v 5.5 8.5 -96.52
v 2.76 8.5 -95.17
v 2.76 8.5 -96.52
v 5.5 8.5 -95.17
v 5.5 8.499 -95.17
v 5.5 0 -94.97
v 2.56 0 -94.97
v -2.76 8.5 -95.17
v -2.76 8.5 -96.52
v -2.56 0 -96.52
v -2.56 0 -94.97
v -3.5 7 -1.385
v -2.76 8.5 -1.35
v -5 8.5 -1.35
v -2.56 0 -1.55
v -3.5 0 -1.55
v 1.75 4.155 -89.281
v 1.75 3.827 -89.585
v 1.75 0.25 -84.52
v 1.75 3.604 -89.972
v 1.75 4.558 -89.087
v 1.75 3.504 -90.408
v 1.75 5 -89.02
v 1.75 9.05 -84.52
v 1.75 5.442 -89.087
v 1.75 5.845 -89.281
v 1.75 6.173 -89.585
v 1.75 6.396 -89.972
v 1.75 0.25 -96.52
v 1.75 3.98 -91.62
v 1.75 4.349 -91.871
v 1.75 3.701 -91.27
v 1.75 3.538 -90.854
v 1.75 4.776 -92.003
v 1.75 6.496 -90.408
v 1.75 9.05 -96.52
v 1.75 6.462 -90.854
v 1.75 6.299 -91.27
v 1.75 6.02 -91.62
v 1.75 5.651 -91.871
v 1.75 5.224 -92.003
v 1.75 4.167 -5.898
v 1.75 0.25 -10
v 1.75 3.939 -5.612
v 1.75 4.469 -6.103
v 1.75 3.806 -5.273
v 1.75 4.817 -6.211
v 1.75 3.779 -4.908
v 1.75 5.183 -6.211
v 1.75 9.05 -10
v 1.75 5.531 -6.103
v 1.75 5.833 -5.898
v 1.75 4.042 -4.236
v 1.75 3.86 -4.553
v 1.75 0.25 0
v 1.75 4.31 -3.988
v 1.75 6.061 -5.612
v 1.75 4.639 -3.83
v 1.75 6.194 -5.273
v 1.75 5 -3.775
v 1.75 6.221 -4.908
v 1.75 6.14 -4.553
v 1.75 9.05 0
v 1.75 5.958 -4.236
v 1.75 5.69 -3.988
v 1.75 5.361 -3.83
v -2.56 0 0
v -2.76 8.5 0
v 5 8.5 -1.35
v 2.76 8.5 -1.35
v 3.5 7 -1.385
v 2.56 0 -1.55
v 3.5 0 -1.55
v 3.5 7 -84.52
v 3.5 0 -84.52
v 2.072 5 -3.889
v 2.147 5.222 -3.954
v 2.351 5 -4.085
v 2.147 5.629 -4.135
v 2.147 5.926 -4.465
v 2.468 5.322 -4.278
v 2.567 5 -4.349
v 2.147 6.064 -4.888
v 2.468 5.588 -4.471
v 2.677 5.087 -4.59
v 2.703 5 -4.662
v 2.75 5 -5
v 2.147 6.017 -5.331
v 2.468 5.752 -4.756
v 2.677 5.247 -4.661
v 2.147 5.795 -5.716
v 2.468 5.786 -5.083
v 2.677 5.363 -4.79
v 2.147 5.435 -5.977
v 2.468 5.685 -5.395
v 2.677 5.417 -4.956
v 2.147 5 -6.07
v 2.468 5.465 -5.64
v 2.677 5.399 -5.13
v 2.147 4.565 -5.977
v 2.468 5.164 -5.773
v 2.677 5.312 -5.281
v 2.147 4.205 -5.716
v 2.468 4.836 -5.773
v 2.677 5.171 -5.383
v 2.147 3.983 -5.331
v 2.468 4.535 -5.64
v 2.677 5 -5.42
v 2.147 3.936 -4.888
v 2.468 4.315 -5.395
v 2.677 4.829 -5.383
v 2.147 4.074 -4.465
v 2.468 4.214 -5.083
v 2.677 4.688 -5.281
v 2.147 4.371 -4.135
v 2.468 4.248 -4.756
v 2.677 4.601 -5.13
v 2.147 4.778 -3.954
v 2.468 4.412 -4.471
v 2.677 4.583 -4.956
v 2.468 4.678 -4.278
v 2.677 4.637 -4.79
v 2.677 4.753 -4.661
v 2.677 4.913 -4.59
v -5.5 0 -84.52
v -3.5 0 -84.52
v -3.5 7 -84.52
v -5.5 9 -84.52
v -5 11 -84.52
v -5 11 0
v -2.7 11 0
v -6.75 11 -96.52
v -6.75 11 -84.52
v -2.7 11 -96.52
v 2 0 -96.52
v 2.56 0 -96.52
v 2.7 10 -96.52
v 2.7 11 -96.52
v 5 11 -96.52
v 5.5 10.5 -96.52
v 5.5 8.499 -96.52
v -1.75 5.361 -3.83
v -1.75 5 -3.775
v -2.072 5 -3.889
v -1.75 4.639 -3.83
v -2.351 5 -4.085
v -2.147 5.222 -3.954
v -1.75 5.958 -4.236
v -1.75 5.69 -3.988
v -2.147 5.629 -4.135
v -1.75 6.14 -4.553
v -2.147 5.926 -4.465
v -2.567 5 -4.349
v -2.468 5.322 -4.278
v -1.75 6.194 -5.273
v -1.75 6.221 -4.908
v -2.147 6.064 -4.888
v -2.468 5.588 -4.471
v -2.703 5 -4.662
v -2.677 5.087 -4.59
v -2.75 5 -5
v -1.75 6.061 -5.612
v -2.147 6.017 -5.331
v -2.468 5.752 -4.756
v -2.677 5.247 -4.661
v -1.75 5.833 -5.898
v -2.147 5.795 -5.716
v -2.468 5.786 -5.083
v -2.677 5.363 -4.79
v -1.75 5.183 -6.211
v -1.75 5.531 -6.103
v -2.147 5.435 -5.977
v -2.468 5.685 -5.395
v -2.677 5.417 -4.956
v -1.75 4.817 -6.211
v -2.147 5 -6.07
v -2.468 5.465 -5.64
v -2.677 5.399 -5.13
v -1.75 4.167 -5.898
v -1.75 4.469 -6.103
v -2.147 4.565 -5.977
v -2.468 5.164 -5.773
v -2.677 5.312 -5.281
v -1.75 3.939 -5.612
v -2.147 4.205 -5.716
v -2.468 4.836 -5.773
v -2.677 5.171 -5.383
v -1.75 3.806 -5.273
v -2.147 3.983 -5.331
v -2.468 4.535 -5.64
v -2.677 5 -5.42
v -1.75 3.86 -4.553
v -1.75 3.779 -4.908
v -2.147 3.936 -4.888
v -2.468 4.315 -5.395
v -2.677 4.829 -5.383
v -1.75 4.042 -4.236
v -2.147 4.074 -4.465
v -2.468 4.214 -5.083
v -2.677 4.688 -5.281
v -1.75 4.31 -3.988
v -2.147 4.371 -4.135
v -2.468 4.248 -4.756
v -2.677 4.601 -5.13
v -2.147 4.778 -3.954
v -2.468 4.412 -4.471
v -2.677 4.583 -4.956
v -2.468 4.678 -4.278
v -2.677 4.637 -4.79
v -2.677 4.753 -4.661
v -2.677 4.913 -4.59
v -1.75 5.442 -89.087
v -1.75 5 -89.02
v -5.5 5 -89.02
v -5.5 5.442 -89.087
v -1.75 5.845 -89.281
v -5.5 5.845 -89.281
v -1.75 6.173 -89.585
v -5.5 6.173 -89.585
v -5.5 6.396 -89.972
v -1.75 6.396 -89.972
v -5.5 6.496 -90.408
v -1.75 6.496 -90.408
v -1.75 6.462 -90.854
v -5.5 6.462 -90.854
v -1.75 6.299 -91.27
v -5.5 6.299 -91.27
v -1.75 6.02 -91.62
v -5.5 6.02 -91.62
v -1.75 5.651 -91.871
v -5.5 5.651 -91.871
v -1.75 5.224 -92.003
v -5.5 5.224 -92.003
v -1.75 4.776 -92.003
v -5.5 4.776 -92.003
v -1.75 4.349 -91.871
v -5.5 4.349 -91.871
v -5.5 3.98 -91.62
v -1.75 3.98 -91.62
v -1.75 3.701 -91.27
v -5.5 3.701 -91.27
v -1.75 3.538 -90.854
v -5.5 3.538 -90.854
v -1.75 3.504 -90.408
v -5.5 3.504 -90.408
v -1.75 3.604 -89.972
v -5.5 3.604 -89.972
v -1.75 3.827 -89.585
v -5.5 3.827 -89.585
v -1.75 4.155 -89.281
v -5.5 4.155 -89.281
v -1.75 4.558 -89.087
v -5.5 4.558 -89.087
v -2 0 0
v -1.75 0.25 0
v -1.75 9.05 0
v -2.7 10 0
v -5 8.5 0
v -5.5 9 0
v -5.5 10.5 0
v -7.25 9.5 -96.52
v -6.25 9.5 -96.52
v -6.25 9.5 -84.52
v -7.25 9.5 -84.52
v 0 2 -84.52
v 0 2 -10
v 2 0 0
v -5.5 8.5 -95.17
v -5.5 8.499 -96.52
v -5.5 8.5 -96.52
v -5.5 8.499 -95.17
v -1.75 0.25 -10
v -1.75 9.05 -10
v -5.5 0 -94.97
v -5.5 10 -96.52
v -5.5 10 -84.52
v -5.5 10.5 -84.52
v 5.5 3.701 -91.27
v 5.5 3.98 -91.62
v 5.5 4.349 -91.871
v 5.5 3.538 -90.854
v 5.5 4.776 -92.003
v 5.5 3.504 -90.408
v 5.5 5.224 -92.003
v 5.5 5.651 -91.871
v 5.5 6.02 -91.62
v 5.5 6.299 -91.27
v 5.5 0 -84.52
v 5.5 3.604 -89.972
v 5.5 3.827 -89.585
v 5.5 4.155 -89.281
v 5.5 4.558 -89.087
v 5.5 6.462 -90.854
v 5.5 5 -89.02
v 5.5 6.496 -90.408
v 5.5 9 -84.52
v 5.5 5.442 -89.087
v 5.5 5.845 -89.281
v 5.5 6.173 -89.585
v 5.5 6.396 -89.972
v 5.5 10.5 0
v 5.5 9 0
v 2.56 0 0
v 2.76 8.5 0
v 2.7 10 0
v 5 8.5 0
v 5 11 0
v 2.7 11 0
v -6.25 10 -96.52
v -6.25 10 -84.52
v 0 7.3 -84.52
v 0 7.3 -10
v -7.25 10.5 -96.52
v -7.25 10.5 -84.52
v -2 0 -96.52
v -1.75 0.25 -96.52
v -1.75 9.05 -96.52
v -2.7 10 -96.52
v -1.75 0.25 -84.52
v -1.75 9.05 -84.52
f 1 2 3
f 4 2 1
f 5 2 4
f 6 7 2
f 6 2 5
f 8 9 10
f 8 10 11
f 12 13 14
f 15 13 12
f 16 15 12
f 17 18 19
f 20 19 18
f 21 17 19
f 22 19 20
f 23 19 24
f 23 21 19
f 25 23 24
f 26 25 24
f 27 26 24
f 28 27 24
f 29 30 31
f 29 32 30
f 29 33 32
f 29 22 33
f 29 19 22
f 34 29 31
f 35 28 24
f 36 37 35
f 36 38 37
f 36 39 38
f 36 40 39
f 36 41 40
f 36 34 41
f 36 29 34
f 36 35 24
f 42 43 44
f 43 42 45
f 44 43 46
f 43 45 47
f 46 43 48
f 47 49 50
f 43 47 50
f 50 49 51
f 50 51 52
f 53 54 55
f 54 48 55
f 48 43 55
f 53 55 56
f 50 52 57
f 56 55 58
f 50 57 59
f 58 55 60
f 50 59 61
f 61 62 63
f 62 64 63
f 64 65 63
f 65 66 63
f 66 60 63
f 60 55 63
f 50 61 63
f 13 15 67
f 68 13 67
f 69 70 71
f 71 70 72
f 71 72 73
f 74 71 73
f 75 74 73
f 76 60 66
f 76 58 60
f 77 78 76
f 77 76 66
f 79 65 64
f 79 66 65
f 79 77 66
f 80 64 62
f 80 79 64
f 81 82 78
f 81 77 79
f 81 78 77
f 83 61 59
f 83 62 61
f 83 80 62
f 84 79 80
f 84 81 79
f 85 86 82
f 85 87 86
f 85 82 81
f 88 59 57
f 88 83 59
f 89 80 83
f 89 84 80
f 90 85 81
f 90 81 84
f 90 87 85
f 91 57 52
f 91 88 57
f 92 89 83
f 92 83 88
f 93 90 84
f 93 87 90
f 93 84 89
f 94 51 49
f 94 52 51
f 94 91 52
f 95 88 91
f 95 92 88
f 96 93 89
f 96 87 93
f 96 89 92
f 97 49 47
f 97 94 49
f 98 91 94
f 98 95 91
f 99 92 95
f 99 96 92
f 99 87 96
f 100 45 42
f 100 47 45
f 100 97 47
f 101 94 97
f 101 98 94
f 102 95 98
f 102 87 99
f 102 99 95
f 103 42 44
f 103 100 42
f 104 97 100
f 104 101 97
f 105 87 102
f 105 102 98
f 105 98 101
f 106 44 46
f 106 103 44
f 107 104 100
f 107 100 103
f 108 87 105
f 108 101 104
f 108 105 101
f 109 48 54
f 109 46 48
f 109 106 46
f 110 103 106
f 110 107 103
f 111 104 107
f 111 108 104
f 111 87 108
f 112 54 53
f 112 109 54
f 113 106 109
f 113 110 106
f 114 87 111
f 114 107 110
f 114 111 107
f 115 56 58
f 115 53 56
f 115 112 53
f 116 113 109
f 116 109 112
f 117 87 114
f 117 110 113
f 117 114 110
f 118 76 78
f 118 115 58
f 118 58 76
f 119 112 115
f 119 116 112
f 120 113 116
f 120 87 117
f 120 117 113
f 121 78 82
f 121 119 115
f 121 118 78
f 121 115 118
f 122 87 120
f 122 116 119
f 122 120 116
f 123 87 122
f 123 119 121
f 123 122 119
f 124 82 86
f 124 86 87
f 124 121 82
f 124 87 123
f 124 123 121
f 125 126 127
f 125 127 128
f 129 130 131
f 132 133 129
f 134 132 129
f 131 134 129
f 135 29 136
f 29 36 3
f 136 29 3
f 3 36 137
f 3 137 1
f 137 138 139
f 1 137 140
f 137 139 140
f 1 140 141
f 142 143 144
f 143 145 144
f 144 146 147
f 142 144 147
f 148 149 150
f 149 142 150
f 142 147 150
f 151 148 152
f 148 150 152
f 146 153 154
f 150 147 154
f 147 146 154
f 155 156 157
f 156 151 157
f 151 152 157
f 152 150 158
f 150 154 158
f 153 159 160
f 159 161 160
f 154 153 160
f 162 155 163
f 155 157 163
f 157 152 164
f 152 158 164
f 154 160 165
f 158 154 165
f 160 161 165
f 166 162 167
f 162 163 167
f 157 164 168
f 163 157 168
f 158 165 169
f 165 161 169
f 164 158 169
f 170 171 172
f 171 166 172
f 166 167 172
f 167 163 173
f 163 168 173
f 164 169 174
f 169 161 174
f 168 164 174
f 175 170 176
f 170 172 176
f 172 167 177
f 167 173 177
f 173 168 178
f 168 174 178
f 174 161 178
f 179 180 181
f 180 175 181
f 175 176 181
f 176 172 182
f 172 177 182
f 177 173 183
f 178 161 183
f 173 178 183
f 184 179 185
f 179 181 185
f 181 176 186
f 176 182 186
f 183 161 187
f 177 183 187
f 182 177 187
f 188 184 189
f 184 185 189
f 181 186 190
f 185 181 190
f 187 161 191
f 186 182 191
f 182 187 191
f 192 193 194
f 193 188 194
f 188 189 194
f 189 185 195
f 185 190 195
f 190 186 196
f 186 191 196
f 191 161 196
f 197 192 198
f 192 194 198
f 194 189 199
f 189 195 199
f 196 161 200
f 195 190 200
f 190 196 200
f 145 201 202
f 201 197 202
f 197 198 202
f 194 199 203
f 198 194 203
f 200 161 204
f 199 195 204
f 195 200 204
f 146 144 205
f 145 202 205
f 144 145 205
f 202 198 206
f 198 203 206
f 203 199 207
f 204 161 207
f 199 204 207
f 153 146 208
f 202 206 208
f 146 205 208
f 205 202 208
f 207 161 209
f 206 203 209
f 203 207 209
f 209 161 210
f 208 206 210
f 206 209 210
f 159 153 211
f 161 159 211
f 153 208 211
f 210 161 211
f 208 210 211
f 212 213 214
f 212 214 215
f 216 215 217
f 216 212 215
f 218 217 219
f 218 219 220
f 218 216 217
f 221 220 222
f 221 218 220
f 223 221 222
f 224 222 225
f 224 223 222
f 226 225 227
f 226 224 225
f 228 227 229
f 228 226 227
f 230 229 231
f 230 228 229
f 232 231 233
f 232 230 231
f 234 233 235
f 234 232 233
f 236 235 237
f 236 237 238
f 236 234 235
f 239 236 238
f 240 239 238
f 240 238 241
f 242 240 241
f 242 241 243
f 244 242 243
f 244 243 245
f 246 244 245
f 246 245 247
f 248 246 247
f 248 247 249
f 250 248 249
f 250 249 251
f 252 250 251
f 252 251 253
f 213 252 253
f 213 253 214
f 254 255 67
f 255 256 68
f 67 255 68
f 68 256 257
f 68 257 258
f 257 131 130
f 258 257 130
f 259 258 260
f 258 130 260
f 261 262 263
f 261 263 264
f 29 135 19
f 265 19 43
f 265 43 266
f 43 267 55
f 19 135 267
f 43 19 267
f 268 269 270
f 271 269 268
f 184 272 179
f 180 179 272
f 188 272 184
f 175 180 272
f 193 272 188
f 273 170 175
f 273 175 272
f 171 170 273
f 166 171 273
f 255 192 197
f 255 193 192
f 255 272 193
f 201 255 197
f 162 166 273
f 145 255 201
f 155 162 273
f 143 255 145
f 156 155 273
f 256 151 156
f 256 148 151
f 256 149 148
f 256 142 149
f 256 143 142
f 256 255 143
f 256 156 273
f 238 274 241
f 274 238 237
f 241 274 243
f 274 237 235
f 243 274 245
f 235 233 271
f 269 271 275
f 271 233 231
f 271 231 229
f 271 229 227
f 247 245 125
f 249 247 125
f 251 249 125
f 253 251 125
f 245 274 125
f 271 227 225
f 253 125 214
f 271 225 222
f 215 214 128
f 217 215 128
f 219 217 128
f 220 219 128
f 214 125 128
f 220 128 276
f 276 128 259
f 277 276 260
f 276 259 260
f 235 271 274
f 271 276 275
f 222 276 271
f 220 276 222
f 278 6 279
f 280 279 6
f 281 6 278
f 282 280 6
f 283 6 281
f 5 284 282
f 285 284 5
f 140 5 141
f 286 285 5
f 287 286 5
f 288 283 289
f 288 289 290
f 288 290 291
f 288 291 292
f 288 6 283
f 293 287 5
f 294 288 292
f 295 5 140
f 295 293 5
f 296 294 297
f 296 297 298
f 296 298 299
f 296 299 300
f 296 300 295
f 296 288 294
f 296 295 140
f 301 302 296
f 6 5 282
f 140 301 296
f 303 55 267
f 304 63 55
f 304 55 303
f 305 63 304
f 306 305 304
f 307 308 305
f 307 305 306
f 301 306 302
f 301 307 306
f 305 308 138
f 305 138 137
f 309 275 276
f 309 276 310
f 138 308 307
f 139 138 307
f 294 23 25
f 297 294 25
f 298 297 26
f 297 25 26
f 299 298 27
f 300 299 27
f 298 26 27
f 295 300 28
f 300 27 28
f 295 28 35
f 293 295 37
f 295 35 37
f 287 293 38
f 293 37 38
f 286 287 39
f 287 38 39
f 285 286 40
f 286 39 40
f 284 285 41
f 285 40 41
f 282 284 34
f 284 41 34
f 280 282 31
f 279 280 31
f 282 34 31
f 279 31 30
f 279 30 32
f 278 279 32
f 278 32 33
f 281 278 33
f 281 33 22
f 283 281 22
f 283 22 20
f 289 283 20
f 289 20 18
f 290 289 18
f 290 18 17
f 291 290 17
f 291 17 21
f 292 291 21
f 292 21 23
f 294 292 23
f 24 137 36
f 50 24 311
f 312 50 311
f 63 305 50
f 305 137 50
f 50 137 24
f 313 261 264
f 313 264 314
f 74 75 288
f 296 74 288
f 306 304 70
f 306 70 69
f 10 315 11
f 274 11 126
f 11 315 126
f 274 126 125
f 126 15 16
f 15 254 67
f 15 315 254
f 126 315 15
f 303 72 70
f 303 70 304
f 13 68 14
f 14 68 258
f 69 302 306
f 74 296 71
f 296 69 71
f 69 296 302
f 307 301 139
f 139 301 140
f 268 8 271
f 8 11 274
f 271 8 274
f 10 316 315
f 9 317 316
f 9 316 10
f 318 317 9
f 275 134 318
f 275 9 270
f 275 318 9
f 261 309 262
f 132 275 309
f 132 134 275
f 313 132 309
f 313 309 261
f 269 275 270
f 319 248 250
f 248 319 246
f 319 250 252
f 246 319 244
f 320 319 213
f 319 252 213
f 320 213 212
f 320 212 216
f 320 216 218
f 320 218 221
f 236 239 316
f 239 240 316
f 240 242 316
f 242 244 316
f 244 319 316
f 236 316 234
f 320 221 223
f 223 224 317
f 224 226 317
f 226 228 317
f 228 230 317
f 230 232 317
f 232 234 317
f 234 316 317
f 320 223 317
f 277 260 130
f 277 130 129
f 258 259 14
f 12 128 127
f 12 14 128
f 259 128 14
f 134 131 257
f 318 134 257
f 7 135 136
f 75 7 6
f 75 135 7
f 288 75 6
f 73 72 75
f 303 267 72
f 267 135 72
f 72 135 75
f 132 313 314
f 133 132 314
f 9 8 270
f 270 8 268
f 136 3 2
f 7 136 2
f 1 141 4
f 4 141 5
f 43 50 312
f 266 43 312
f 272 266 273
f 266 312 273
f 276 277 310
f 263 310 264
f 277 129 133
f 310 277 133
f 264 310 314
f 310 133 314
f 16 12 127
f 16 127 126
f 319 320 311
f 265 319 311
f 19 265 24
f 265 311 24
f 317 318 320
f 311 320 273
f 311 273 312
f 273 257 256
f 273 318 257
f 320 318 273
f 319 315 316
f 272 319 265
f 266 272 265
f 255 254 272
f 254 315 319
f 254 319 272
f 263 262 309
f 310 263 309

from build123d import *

# Parameters (mm, degrees)
SKETCH1_W                        = 5.5
SKETCH1_H                        = 11
MAIN_BASE_DEPTH                  = 96.52
SIDE_CUT_OUT_DEPTH               = 84.52
TOP_RUBBER_BAND_CUT_OUT_DEPTH    = 98.300361767
BOTTOM_RUBBER_BAND_CUT_OUT_DEPTH = 98.300361767
SKETCH6_W                        = 1.75
SKETCH6_H                        = 11
MOTOR_PULLEY_CUT_OUT_DEPTH       = 12
SKETCH7_W                        = 1.75
SKETCH7_H                        = 11
PULLEY_CUT_OUT_DEPTH             = 10
SKETCH11_R                       = 1.5
MOTOR_SHAFT_CUT_OUT_DEPTH        = 98.217143036
SKETCH17_W                       = 3.14
SKETCH17_H                       = 2.8
MOUNTING_POINTS_DEPTH            = 8.5
MOUNTING_POINTS_DRAFT            = -1.348
MOUNTING_POINTS_PROFILE_2_DEPTH  = 8.5
MOUNTING_POINTS_PROFILE_2_DRAFT  = -1.348
SKETCH13_W                       = 1
SKETCH13_H                       = 0.5
BOSS_EXTRUDE3_DEPTH              = 12
RAIL_CHAMFER_SIZE                = 0.5


with BuildPart() as part:
    # Sketch1 → main_base (new body)
    with BuildSketch(Plane.XY):
        with Locations((2.75, 5.5)):
            Rectangle(SKETCH1_W, SKETCH1_H)
    extrude(amount=-MAIN_BASE_DEPTH)

    # Sketch3 → side_cut_out (cut)
    with BuildSketch(Plane.XY):
        Polygon((5.5, 9), (3.5, 7), (3.5, 0), (5.5, 0), align=None)
    extrude(amount=-SIDE_CUT_OUT_DEPTH, mode=Mode.SUBTRACT)

    # Sketch4 → top_rubber_band_cut_out (cut, through all)
    with BuildSketch(Plane.XY):
        Polygon((0, 7.3), (0, 11), (2.7, 11), (2.7, 10), align=None)
    extrude(amount=-TOP_RUBBER_BAND_CUT_OUT_DEPTH, mode=Mode.SUBTRACT)

    # Sketch5 → bottom_rubber_band_cut_out (cut, through all)
    with BuildSketch(Plane.XY):
        Polygon((2, 0), (0, 2), (0, 0), align=None)
    extrude(amount=-BOTTOM_RUBBER_BAND_CUT_OUT_DEPTH, mode=Mode.SUBTRACT)

    # Sketch6 → motor_pulley_cut_out (cut)
    with BuildSketch(Plane(origin=(0, 0, -96.52), x_dir=(-1, 0, 0), z_dir=(0, 0, -1))):
        with Locations((-0.875, 5.5)):
            Rectangle(SKETCH6_W, SKETCH6_H)
    extrude(amount=-MOTOR_PULLEY_CUT_OUT_DEPTH, mode=Mode.SUBTRACT)

    # Sketch7 → pulley_cut_out (cut)
    with BuildSketch(Plane.XY):
        with Locations((0.875, 5.5)):
            Rectangle(SKETCH7_W, SKETCH7_H)
    extrude(amount=-PULLEY_CUT_OUT_DEPTH, mode=Mode.SUBTRACT)

    # Sketch10 → half_circle_cut_out (revolve, cut)
    with BuildSketch(Plane(origin=(0, 5, 0), x_dir=(1, 0, 0), z_dir=(0, 1, 0))):
        with BuildLine():
            Line((1.5, 5), (1.5, 3.75))
            ThreePointArc((1.5, 3.75), (2.383883476, 4.116116524), (2.75, 5))
            Line((2.75, 5), (1.5, 5))
        make_face()
    revolve(axis=Axis((2.75, 5, -5), (-1, 0, 0)), mode=Mode.SUBTRACT)

    # Sketch11 → motor_shaft_cut_out (cut, through all)
    with BuildSketch(Plane.ZY.offset(-1.75)):
        with Locations((-90.52, 5)):
            Circle(SKETCH11_R)
    extrude(amount=-MOTOR_SHAFT_CUT_OUT_DEPTH, mode=Mode.SUBTRACT)


with BuildPart() as mounting_points_tool:
    # Sketch17 → mounting_points (with draft: the straight prism first)
    with BuildSketch(Plane.XZ):
        with Locations((4.13, -0.15)):
            Rectangle(SKETCH17_W, SKETCH17_H)
    extrude(amount=-MOUNTING_POINTS_DEPTH)
    # mounting_points: the draft: its side faces are tilted about the plane it starts from
    mounting_points_sides = [mounting_points_tool.faces().sort_by_distance(p)[0] for p in [
        (4.13, 4.25, 1.25),
        (2.56, 4.25, -0.15),
        (4.13, 4.25, -1.55),
        (5.7, 4.25, -0.15),
    ]]
    draft(mounting_points_sides, Plane.XZ, MOUNTING_POINTS_DRAFT)


with BuildPart() as part_1:
    add(part.part)

    # mounting_points: cut by mounting_points_tool
    add(mounting_points_tool.part, mode=Mode.SUBTRACT)


with BuildPart() as mounting_points_profile_2_tool:
    # Sketch17 → mounting_points profile 2 (with draft: the straight prism first)
    with BuildSketch(Plane.XZ):
        with Locations((4.13, -96.37)):
            Rectangle(SKETCH17_W, SKETCH17_H)
    extrude(amount=-MOUNTING_POINTS_PROFILE_2_DEPTH)
    # mounting_points profile 2: the draft: its side faces are tilted about the plane it starts from
    mounting_points_profile_2_sides = [mounting_points_profile_2_tool.faces().sort_by_distance(p)[0] for p in [
        (4.13, 4.25, -97.77),
        (5.7, 4.25, -96.37),
        (4.13, 4.25, -94.97),
        (2.56, 4.25, -96.37),
    ]]
    draft(mounting_points_profile_2_sides, Plane.XZ, MOUNTING_POINTS_PROFILE_2_DRAFT)


with BuildPart() as part_2:
    add(part_1.part)

    # mounting_points profile 2: cut by mounting_points_profile_2_tool
    add(mounting_points_profile_2_tool.part, mode=Mode.SUBTRACT)

    # final_mirror: part across plane


with BuildPart() as part_3:
    add(part_2.part)
    add(part_2.part.mirror(Plane(origin=(0, 0, 0), x_dir=(0, 0, 1), z_dir=(1, 0, 0))))

    # Sketch13 → Boss-Extrude3 (add)
    with BuildSketch(Plane(origin=(0, 0, -96.52), x_dir=(-1, 0, 0), z_dir=(0, 0, -1))):
        Polygon((7.25, 11), (5.5, 11), (5.5, 10), (6.25, 10), (7.25, 10), align=None)
        with Locations((6.75, 9.75)):
            Rectangle(SKETCH13_W, SKETCH13_H)
    extrude(amount=-BOSS_EXTRUDE3_DEPTH)

    # rail_chamfer
    rail_chamfer_edges = [part_3.edges().sort_by_distance(p)[0] for p in [
        (-5.5, 11, -42.26),
        (-7.25, 11, -90.52),
        (5.5, 11, -48.26),
    ]]
    chamfer(rail_chamfer_edges, length=RAIL_CHAMFER_SIZE)


solid = part_3.part
